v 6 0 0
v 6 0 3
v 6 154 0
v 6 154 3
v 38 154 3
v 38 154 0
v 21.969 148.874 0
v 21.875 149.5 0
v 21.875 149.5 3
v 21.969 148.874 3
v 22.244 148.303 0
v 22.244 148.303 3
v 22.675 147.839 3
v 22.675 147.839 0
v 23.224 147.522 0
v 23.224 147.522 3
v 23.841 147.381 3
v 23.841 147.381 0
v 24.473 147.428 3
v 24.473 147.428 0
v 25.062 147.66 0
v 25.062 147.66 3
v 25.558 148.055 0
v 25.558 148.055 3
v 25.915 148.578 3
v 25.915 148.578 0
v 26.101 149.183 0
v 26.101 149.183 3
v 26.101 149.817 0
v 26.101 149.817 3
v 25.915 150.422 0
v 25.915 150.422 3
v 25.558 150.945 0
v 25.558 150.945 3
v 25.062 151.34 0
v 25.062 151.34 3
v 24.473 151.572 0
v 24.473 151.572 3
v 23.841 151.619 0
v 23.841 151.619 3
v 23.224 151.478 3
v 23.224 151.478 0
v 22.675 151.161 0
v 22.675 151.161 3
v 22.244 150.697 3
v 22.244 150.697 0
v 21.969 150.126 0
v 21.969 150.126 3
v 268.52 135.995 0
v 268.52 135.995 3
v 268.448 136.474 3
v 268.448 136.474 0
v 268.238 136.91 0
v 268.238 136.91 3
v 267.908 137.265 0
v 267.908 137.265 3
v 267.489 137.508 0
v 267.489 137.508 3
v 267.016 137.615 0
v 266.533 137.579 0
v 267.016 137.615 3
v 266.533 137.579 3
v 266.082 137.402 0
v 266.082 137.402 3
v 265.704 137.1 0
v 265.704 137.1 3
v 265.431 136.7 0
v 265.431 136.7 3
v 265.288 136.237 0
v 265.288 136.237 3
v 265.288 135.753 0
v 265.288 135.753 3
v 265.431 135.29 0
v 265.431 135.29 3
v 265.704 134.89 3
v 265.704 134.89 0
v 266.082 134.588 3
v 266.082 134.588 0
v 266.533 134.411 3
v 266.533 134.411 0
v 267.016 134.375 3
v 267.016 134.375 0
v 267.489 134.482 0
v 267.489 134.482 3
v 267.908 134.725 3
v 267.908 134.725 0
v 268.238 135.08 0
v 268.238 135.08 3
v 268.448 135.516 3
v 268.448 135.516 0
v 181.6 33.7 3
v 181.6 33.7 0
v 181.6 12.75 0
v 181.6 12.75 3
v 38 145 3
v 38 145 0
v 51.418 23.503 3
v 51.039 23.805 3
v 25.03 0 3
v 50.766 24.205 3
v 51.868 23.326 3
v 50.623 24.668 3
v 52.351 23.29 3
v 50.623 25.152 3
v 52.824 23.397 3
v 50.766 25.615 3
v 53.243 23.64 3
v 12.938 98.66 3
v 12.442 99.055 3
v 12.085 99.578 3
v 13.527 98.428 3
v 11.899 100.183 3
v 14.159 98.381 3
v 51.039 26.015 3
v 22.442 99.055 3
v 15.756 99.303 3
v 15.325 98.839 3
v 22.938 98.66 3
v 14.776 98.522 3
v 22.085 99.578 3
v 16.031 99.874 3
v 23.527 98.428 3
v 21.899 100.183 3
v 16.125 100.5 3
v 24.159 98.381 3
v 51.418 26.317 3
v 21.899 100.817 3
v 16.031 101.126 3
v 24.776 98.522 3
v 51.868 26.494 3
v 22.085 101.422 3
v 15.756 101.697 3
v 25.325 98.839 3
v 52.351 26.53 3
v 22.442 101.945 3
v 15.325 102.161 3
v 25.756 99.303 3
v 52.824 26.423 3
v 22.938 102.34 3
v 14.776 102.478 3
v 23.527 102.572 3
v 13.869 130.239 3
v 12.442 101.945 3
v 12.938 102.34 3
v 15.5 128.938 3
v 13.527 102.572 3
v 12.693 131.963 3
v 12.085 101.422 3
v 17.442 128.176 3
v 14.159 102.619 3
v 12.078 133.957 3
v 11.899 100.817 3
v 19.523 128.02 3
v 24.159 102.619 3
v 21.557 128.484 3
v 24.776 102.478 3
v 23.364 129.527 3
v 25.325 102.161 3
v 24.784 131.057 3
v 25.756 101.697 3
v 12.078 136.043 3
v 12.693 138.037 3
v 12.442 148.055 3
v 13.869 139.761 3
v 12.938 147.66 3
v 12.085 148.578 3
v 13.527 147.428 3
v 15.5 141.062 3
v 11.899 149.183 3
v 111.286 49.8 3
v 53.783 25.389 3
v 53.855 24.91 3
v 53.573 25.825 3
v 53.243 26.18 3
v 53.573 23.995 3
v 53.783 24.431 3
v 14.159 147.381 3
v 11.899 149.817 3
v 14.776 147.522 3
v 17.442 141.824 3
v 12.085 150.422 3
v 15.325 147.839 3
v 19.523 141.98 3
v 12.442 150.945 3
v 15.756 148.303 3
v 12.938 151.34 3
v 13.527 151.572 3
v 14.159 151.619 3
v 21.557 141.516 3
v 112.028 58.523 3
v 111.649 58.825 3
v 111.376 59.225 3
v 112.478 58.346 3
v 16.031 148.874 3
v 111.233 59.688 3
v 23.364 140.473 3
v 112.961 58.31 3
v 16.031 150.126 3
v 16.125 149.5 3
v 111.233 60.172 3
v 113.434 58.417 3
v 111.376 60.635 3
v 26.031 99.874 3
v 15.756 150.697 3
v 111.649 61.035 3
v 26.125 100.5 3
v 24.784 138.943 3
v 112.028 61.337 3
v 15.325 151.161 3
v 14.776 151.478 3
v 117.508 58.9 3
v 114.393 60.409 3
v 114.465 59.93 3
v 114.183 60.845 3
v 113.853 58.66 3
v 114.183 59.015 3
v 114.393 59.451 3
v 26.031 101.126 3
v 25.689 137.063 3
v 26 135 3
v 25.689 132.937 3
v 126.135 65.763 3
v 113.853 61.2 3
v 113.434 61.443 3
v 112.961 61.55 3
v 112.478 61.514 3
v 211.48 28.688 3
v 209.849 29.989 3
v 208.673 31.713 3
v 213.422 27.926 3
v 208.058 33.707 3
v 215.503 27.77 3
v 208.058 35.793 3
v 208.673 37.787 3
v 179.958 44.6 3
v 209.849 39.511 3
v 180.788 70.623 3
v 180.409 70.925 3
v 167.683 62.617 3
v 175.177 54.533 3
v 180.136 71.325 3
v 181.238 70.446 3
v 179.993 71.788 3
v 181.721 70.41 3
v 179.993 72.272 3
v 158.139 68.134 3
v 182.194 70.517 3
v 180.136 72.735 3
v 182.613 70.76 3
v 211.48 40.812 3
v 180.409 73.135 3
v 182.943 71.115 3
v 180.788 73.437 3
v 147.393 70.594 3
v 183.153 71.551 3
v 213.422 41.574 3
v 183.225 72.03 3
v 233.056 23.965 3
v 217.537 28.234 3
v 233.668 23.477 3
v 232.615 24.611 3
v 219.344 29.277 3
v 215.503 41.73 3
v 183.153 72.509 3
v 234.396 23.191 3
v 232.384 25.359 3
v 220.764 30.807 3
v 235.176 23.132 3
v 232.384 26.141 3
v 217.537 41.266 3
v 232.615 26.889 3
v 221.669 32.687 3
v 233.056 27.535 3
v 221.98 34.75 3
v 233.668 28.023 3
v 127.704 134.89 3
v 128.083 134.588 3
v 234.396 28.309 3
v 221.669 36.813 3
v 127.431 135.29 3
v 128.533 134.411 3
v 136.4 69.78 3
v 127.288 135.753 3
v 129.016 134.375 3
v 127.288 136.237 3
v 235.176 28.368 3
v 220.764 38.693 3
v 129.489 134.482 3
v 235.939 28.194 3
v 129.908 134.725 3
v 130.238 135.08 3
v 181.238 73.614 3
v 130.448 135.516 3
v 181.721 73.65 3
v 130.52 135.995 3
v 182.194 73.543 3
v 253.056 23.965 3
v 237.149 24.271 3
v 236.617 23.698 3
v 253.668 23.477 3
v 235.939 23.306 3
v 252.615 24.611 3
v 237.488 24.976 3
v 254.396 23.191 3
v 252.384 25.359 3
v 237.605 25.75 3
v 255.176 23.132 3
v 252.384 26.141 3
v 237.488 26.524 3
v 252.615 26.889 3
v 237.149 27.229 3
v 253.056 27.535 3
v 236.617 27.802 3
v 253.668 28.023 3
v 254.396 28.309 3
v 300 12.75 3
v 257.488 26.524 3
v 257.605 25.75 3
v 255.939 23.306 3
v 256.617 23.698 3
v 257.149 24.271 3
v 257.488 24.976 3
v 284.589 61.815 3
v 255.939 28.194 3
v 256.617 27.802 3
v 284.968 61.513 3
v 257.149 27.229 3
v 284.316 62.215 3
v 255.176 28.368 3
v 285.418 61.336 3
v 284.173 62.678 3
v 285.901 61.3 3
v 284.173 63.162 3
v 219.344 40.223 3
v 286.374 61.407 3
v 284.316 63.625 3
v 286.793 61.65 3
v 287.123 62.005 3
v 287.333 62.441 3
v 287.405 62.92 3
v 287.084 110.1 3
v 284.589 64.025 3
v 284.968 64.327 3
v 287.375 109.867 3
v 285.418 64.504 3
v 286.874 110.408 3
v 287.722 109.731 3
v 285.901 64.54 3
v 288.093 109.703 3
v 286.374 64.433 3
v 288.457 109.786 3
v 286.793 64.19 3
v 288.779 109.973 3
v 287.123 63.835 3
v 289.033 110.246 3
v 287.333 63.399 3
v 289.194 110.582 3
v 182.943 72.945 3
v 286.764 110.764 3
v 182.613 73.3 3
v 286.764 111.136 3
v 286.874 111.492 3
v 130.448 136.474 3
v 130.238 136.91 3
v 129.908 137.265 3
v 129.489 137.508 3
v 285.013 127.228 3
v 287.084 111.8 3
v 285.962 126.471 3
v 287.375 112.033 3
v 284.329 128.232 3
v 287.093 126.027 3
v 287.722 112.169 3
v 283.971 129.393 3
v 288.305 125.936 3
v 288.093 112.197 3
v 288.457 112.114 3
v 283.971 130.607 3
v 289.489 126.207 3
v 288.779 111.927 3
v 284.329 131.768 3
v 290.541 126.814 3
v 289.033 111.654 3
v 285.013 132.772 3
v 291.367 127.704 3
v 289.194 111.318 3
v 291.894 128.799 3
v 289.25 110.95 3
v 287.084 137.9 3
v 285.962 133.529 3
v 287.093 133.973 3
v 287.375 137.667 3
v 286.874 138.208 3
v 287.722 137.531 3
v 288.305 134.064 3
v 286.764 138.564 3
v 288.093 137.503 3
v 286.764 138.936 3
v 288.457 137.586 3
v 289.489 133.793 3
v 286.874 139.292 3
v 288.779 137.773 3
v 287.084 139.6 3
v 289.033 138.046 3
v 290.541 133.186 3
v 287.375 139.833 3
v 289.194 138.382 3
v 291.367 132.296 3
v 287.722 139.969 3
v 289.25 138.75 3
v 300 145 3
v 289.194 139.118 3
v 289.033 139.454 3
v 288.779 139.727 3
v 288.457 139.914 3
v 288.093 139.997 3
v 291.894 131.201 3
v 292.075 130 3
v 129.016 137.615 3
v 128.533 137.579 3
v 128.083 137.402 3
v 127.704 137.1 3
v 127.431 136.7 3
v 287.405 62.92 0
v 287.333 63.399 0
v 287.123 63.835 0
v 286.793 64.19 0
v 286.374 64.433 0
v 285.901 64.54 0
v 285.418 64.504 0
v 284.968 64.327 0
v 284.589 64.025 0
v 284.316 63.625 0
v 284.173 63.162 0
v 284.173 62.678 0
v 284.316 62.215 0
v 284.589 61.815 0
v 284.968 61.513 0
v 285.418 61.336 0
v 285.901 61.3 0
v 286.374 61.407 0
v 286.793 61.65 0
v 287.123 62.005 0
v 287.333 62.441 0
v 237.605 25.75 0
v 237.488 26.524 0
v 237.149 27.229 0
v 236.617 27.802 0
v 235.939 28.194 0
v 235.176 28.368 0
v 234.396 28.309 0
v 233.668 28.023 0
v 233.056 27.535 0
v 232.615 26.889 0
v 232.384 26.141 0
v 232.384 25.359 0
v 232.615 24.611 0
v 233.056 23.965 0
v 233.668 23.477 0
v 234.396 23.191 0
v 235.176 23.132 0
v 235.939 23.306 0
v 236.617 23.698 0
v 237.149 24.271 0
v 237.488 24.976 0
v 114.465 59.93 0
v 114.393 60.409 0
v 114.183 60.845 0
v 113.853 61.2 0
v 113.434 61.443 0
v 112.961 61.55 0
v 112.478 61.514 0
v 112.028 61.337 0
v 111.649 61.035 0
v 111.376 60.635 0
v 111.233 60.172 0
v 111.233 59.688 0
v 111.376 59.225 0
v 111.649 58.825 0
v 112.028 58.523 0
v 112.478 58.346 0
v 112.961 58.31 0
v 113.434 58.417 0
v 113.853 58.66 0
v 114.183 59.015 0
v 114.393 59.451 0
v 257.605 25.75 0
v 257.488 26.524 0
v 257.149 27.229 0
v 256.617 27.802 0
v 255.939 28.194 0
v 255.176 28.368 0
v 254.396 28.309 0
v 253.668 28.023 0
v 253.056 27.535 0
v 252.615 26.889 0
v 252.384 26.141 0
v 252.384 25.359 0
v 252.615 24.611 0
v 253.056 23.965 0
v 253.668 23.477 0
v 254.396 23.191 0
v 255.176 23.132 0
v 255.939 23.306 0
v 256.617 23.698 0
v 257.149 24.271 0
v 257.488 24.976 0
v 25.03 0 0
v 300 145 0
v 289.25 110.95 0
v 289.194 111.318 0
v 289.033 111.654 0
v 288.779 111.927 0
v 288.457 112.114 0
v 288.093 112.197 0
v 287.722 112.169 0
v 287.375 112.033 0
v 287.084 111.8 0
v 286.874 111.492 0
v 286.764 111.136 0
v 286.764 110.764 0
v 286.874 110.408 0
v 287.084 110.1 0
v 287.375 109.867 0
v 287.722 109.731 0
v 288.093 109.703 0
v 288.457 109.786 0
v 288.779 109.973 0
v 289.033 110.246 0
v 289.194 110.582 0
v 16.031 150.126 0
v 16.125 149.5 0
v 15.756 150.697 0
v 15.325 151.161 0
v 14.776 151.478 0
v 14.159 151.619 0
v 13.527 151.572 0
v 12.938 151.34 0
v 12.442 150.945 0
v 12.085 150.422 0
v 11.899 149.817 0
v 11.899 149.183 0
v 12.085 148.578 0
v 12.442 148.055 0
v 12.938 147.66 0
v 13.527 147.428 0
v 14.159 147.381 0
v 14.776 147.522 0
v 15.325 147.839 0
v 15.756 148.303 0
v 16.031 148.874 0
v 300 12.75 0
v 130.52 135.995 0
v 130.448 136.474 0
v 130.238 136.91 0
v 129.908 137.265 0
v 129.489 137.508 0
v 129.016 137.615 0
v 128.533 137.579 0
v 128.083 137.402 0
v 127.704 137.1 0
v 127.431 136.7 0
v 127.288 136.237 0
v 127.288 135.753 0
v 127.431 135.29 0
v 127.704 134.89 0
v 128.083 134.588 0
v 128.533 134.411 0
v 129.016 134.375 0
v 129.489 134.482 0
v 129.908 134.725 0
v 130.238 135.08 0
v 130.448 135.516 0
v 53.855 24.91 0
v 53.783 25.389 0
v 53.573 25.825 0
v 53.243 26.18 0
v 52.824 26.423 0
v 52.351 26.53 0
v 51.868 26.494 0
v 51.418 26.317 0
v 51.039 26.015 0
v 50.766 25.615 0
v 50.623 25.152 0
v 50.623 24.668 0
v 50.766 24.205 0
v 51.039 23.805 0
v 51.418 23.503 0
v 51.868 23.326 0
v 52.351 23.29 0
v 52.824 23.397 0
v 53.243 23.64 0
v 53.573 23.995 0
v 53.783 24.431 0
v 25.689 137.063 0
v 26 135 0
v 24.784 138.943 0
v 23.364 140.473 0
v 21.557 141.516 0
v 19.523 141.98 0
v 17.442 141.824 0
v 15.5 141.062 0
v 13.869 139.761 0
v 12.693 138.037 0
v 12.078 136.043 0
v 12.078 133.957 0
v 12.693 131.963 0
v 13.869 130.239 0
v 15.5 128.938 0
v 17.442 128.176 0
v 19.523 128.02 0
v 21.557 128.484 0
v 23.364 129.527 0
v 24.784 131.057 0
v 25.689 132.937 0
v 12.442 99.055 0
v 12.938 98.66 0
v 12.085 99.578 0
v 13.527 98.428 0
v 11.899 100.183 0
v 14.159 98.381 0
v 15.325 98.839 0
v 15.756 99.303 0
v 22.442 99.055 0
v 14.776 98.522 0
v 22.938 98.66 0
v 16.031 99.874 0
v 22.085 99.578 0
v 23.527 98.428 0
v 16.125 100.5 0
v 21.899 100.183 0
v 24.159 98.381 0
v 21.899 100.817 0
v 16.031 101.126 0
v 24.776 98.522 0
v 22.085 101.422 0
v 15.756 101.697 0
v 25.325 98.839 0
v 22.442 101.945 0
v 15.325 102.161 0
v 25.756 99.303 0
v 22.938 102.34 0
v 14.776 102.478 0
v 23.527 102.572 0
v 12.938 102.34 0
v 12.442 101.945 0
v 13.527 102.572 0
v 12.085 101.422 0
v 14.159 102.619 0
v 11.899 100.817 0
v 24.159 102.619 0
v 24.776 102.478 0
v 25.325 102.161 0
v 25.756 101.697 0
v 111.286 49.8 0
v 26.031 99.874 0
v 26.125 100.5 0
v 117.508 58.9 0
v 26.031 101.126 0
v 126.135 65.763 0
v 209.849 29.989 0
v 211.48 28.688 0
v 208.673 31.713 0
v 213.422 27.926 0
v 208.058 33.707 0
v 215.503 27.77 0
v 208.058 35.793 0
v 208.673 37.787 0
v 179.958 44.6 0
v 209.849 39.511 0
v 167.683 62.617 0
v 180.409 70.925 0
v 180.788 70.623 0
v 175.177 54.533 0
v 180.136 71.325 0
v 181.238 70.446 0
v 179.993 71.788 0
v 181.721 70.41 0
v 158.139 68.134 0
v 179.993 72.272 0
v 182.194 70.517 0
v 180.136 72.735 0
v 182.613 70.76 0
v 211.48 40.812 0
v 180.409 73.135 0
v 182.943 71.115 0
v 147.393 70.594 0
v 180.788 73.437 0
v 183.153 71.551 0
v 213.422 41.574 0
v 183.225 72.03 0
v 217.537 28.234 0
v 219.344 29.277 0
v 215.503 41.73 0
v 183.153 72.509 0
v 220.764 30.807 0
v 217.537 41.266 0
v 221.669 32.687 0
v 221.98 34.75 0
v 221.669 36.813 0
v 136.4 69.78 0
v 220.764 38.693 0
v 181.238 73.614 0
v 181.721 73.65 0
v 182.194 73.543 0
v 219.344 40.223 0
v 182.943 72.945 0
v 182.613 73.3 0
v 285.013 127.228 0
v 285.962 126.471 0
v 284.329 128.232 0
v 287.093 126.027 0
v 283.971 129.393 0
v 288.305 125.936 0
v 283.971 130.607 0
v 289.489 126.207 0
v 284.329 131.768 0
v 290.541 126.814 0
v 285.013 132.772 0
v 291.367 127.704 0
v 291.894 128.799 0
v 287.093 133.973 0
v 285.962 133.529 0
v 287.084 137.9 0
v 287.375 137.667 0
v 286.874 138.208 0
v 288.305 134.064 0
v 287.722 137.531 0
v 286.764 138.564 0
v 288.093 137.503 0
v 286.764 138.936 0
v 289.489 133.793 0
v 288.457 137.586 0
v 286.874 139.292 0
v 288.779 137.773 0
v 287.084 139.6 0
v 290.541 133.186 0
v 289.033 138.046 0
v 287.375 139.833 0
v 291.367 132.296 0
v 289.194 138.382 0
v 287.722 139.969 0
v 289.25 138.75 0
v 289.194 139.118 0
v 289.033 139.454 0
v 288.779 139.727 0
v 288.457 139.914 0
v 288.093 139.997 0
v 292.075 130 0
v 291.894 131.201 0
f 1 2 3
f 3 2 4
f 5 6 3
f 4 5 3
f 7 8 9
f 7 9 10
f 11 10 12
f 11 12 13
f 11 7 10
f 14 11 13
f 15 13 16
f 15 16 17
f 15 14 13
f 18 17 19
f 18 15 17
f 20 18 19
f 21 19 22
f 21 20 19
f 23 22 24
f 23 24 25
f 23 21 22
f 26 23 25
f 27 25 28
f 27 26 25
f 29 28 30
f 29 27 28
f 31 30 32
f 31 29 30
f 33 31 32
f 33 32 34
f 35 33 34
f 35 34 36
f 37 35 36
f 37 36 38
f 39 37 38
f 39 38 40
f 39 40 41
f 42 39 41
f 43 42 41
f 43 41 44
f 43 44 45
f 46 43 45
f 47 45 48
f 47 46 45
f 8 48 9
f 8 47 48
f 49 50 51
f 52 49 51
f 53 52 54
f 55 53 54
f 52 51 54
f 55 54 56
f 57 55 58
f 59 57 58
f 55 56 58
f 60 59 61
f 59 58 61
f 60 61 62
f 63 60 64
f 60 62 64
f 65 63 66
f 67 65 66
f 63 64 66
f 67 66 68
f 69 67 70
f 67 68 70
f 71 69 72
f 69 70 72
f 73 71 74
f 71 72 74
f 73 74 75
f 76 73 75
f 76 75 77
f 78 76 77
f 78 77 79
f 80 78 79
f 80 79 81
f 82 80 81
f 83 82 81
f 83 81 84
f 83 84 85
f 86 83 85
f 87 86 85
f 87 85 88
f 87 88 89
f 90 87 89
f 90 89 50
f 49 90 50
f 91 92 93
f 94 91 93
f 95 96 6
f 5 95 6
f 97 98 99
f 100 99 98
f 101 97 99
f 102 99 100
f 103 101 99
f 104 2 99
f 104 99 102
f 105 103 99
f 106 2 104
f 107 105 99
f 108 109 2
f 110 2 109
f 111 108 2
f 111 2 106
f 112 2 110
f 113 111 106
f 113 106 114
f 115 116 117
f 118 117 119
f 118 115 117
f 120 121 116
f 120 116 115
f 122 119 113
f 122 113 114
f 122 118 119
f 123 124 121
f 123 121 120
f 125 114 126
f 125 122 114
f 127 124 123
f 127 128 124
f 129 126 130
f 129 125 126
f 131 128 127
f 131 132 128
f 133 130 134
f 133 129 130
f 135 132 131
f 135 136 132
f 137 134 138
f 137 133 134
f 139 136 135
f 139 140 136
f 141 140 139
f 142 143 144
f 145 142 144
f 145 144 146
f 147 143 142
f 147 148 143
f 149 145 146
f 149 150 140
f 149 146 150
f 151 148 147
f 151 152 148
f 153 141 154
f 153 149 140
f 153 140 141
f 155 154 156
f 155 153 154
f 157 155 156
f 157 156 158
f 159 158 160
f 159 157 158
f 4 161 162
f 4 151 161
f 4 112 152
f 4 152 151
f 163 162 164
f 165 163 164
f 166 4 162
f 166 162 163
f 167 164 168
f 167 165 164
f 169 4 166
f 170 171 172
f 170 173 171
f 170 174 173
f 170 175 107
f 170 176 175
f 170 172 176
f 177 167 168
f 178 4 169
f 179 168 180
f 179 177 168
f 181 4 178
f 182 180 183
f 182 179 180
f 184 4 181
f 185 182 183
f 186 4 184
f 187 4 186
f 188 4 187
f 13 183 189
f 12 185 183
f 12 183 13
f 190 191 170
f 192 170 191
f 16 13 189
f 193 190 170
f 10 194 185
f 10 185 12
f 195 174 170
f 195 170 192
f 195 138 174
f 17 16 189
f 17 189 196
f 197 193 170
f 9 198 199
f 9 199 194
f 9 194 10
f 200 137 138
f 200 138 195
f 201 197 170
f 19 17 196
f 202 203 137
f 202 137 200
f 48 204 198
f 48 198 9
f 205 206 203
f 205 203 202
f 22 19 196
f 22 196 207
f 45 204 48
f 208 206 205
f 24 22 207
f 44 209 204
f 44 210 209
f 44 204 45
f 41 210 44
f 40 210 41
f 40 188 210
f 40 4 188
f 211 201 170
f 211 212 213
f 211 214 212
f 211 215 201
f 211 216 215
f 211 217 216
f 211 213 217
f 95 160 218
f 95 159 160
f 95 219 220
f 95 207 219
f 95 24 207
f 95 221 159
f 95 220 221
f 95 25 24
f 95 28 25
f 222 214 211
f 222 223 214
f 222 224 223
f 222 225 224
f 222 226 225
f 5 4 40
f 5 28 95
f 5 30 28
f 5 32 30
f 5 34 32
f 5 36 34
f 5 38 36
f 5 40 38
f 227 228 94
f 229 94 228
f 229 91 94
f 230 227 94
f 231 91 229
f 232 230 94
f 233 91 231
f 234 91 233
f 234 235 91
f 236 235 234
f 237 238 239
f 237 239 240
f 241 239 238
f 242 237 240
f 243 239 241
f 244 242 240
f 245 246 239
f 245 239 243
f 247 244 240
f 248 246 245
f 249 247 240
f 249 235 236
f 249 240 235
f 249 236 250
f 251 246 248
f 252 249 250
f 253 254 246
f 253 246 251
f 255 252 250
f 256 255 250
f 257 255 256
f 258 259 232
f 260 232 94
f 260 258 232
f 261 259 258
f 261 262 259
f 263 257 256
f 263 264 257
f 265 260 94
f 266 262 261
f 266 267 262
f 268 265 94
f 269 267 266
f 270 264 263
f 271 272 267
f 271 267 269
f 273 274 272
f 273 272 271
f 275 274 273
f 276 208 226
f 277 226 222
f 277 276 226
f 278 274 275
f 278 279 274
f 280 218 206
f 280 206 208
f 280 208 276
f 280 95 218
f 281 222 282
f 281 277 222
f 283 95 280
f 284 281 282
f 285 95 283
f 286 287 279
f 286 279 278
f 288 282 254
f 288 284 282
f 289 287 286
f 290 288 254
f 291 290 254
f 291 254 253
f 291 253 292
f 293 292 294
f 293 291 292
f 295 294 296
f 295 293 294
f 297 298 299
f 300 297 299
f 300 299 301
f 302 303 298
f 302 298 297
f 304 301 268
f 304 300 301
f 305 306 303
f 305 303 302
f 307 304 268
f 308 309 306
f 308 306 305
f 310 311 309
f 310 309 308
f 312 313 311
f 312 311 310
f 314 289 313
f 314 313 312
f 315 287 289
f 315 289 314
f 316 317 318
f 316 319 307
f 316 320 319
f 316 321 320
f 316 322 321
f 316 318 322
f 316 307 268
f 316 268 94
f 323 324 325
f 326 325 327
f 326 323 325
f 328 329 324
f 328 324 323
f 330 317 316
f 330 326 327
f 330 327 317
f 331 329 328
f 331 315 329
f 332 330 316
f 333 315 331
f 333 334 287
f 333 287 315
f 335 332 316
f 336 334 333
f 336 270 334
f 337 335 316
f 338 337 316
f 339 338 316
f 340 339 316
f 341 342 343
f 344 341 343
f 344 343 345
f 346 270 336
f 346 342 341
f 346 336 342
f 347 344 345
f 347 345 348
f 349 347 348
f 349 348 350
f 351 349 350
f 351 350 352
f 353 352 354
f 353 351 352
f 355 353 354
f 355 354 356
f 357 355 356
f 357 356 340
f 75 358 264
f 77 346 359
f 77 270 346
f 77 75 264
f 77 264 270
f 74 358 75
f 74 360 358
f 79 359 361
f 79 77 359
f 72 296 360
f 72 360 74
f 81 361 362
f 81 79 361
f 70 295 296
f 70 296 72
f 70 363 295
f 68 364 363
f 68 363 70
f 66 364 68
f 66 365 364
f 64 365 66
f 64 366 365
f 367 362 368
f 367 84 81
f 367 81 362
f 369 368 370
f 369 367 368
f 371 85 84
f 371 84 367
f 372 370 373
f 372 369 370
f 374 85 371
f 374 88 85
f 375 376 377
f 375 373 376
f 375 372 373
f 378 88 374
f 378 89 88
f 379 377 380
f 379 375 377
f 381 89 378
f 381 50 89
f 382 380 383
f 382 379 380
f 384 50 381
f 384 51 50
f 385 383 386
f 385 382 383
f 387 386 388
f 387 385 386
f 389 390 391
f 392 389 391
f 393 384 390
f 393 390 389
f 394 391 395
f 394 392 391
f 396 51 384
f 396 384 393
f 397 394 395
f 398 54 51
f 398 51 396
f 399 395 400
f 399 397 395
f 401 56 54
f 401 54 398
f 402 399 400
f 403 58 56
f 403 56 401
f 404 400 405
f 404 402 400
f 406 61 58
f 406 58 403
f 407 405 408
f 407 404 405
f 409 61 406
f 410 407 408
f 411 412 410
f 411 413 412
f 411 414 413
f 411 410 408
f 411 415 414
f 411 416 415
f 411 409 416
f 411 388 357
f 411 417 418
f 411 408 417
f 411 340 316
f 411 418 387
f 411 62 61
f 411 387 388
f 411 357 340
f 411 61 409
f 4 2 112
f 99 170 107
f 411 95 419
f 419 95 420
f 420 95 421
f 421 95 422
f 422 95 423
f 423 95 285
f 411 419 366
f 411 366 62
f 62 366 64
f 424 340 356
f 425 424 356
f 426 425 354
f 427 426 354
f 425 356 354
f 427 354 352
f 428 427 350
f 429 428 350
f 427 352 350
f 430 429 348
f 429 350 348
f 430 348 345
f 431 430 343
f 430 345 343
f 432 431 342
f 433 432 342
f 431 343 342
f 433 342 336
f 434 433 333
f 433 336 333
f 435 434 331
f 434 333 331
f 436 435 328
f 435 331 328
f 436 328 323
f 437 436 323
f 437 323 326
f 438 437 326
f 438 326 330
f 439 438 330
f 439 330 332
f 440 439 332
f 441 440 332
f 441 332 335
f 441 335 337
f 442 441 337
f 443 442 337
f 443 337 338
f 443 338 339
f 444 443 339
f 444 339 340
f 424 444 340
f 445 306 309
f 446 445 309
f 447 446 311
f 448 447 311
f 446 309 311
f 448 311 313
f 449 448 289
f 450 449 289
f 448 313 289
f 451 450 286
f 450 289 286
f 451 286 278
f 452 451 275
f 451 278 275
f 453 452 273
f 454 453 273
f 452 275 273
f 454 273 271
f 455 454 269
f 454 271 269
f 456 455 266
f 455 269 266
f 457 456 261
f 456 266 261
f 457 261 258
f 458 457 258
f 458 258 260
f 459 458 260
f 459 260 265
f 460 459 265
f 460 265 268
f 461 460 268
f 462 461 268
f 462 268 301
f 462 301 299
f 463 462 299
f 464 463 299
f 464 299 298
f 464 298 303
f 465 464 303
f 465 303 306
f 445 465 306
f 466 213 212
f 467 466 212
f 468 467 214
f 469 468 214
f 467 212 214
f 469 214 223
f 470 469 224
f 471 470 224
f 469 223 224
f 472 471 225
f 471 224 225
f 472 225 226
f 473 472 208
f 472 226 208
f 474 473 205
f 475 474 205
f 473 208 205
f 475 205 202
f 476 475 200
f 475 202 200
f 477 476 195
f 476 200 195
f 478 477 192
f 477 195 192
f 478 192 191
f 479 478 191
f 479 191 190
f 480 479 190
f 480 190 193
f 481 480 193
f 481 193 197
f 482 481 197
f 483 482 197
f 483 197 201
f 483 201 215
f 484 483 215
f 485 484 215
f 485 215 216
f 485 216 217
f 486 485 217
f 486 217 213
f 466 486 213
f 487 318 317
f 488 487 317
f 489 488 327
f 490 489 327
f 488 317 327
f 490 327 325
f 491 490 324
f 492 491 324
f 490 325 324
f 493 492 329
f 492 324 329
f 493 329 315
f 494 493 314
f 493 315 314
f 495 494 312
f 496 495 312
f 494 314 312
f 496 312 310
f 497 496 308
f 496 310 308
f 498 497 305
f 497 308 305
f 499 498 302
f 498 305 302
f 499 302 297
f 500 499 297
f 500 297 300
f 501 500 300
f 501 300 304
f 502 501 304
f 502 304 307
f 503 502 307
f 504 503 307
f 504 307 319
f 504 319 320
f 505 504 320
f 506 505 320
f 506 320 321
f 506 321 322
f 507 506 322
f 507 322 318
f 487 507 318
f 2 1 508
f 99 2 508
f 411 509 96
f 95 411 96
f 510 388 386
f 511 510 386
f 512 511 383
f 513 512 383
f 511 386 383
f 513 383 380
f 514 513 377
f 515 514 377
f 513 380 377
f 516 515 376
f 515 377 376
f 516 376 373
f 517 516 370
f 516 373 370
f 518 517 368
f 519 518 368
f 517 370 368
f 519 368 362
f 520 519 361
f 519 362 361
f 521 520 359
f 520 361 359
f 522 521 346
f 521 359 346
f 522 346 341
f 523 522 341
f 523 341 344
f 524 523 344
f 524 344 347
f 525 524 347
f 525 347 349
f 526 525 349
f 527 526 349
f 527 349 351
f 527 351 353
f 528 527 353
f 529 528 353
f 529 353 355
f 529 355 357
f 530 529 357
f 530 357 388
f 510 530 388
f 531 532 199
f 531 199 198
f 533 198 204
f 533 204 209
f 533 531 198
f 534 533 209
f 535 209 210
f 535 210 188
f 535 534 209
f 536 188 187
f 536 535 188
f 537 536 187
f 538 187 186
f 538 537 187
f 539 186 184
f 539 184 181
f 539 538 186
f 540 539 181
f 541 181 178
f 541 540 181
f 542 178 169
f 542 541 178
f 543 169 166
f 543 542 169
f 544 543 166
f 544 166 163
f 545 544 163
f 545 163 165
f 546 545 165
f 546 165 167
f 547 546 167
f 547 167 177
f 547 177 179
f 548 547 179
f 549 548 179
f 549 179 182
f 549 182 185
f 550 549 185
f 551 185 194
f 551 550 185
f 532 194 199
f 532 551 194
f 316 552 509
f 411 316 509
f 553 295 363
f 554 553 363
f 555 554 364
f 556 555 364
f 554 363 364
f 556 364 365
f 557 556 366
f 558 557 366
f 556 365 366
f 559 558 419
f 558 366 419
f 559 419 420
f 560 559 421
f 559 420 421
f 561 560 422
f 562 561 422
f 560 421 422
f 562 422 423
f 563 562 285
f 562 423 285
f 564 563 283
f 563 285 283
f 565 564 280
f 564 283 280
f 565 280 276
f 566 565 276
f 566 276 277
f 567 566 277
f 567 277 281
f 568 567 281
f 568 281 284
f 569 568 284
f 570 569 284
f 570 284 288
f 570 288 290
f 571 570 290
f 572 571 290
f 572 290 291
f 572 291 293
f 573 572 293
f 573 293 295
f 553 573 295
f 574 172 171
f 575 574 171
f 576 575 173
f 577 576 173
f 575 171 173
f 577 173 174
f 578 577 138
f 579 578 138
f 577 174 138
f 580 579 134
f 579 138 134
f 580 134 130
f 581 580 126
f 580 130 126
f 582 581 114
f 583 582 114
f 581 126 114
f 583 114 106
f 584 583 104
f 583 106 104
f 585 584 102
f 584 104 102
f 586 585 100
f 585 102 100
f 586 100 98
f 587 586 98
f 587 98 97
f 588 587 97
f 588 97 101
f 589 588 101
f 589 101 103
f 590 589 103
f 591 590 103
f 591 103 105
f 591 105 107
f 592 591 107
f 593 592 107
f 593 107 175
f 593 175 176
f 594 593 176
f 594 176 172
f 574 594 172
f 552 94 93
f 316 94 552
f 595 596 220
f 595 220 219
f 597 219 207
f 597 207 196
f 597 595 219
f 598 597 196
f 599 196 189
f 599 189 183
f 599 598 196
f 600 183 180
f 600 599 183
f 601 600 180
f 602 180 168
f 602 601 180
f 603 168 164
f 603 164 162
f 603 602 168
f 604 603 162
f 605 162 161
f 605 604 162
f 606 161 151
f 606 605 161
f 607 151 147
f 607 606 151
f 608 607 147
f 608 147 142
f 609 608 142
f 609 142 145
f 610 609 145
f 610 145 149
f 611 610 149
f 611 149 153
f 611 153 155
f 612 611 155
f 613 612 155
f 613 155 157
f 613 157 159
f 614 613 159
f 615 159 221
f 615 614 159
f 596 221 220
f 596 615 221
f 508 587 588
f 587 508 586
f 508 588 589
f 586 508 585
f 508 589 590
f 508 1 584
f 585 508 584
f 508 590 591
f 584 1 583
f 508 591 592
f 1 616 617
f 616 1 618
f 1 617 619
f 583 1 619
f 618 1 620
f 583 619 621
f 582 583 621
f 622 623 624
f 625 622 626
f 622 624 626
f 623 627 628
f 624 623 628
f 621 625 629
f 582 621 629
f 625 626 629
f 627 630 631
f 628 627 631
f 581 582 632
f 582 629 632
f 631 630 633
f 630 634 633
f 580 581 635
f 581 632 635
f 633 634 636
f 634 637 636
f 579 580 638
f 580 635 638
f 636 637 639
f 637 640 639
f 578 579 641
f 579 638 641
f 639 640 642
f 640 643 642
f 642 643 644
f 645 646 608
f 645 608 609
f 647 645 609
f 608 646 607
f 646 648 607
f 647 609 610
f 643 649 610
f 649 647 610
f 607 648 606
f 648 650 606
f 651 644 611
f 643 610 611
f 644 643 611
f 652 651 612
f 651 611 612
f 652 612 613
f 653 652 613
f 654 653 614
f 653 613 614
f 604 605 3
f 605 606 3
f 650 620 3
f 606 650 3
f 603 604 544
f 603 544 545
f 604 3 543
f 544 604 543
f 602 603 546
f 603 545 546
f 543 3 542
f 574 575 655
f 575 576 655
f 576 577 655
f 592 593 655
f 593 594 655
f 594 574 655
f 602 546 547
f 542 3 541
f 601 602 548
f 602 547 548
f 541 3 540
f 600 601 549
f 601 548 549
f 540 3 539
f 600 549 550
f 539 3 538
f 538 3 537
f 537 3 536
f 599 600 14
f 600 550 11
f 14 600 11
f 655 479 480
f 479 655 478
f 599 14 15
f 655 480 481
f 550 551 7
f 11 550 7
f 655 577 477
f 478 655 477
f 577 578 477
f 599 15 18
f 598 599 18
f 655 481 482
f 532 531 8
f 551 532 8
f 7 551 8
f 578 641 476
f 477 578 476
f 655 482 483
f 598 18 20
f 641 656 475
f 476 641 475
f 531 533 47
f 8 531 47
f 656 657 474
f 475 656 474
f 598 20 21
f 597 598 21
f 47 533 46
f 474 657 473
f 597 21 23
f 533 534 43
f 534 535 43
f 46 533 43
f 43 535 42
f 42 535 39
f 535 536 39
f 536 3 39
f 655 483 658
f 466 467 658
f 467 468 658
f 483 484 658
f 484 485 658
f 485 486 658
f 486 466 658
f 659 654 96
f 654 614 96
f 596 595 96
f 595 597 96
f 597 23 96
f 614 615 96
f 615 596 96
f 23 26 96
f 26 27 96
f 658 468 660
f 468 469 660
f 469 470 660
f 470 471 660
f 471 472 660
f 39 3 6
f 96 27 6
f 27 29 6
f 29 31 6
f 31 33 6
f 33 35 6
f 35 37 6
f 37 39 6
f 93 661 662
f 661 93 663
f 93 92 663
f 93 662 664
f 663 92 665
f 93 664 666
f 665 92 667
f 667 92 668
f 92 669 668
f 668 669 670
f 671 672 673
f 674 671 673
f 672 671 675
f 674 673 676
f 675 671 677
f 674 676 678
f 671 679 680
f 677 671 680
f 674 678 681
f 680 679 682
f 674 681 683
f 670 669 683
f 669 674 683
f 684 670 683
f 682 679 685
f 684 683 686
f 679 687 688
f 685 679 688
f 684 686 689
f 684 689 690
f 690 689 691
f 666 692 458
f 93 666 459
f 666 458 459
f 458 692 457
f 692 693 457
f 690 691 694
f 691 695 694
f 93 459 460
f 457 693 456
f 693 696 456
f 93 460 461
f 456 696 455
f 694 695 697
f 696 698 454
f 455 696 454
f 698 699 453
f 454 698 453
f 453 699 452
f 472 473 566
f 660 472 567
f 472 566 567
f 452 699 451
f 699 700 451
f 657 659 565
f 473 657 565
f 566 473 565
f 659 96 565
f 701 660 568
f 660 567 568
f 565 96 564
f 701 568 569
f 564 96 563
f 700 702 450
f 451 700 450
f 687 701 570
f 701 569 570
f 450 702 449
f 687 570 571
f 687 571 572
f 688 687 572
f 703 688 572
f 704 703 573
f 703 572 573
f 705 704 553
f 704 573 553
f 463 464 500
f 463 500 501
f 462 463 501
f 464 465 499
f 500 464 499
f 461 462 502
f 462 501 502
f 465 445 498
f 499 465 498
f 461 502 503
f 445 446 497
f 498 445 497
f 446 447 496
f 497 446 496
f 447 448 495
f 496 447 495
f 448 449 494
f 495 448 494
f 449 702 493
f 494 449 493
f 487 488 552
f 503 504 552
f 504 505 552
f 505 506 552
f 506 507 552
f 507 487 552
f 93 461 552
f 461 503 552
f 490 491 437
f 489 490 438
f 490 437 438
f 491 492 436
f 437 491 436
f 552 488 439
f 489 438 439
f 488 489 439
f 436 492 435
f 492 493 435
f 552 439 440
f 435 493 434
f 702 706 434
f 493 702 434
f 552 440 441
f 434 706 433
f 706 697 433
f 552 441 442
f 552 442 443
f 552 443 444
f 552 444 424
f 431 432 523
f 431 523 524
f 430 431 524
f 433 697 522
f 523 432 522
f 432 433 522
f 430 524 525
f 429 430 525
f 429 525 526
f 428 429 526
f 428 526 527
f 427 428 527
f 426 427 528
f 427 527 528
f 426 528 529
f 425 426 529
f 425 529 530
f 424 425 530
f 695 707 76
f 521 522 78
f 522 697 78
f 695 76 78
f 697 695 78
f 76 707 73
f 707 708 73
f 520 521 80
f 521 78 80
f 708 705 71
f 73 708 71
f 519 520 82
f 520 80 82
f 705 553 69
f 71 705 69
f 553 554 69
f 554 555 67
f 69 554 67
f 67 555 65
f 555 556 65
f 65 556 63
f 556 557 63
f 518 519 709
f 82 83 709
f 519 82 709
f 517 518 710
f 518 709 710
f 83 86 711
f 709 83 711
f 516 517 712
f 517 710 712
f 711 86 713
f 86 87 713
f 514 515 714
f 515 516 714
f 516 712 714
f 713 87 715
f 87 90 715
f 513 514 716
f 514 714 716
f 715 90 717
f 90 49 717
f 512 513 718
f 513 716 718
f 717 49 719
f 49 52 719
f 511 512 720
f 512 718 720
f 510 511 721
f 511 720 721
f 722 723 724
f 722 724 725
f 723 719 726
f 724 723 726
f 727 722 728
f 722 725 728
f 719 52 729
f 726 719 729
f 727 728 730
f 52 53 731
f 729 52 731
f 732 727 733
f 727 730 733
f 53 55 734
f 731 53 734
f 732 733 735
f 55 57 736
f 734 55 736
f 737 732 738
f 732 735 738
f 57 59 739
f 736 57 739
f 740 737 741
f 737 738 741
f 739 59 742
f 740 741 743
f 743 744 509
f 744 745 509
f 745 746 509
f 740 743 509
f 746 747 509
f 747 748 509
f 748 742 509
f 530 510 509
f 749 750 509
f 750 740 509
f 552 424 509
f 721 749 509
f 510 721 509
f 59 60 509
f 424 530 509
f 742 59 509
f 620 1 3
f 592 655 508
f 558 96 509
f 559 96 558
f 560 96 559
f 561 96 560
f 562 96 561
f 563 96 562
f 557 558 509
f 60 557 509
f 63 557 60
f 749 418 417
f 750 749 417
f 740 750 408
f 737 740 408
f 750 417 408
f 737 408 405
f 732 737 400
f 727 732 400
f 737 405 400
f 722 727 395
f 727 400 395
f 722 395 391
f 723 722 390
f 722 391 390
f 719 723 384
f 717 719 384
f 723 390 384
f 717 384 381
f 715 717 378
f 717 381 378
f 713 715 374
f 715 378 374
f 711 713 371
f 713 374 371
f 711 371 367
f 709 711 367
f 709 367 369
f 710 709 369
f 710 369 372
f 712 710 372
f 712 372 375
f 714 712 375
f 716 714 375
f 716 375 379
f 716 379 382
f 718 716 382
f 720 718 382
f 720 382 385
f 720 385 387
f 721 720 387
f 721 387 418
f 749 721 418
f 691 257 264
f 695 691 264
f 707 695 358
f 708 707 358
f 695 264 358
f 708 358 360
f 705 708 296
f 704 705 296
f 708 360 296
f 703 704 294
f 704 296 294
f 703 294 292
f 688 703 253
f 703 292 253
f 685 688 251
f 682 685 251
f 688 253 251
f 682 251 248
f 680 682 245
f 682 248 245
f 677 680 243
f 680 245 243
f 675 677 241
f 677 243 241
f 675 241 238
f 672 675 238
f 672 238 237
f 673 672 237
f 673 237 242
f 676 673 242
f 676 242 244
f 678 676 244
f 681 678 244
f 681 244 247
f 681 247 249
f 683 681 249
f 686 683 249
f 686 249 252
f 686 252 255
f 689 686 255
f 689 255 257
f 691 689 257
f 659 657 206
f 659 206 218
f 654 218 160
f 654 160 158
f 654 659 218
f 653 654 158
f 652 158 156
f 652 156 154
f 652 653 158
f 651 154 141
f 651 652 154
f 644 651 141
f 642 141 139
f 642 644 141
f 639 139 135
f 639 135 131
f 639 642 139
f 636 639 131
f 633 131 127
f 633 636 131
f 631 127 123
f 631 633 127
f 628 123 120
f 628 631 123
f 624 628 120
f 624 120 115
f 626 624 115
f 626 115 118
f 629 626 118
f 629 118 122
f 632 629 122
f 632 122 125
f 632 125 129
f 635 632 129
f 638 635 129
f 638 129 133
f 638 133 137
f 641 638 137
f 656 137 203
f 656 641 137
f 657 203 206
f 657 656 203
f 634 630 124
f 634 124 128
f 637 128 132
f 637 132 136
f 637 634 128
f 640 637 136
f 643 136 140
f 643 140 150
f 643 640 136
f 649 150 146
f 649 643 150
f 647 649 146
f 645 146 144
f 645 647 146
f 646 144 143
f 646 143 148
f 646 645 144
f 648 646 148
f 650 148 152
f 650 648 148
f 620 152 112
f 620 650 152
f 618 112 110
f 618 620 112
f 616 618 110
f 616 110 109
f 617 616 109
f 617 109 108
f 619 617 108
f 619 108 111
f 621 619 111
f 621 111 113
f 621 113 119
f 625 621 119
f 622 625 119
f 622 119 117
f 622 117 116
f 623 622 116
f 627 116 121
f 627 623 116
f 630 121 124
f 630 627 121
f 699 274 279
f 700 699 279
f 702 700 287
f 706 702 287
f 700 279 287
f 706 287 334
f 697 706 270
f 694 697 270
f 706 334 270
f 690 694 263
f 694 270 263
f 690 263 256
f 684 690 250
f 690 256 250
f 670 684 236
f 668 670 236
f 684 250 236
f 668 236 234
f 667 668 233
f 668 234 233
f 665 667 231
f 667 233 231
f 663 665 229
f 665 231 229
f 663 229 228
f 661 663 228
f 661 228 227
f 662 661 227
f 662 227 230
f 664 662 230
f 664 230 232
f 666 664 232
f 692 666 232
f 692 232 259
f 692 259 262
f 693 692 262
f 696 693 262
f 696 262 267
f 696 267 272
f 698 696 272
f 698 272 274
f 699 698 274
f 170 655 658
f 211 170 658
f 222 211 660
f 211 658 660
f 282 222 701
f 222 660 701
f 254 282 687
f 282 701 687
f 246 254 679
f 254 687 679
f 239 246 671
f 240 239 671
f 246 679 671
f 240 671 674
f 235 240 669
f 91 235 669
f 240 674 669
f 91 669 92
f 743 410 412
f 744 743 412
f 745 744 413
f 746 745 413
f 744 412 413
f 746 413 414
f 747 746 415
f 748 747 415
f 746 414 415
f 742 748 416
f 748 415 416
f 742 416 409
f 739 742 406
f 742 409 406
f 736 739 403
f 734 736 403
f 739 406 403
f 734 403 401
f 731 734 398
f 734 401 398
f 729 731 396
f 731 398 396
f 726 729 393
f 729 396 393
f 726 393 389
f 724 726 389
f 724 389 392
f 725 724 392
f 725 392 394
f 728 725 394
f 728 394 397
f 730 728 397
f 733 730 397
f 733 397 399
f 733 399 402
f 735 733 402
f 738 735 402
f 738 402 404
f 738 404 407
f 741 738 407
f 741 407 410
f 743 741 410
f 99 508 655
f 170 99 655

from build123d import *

# Parameters (mm, degrees)
SKETCH2_R           = 7
SKETCH2_R_2         = 2.125
BOSS_EXTRUDE2_DEPTH = 3
SKETCH3_W           = 118.4
SKETCH3_H           = 12.75
CUT_EXTRUDE1_DEPTH  = 338.231374578
SKETCH5_R           = 2.625
SKETCH5_R_2         = 4.075
SKETCH5_R_3         = 1.25
SKETCH5_R_4         = 1.625
SKETCH5_R_5         = 7
SKETCH5_W           = 6
SKETCH5_H           = 154
CUT_EXTRUDE2_DEPTH  = 338.231374578


with BuildPart() as part:
    # Sketch2 → Boss-Extrude2 (new body)
    with BuildSketch(Plane.XY):
        with BuildLine():
            Line((25.03035901, 0), (111.286489227, 49.8))
            ThreePointArc((111.286489227, 49.8), (152.858332199, 69.766604349), (181.6, 33.7))
            Line((181.6, 33.7), (181.6, 0))
            Line((181.6, 0), (300, 0))
            Line((300, 0), (300, 145))
            Line((300, 145), (38, 145))
            Line((38, 145), (38, 154))
            Line((38, 154), (19, 154))
            Line((19, 154), (0, 154))
            Line((0, 154), (0, 0))
            Line((0, 0), (25.03035901, 0))
        make_face()
        with Locations((19, 135)):
            Circle(SKETCH2_R, mode=Mode.SUBTRACT)
        with Locations((14, 149.5)):
            Circle(SKETCH2_R_2, mode=Mode.SUBTRACT)
        with Locations(Location((24, 149.5, 0), (0, 0, 180))):
            Circle(SKETCH2_R_2, mode=Mode.SUBTRACT)
        with Locations((24, 100.5)):
            Circle(SKETCH2_R_2, mode=Mode.SUBTRACT)
        with Locations((14, 100.5)):
            Circle(SKETCH2_R_2, mode=Mode.SUBTRACT)
    extrude(amount=BOSS_EXTRUDE2_DEPTH)

    # Sketch3 → Cut-Extrude1 (cut, through all)
    with BuildSketch(Plane.XY.offset(3)):
        with Locations((240.8, 6.375)):
            Rectangle(SKETCH3_W, SKETCH3_H)
    extrude(amount=-CUT_EXTRUDE1_DEPTH, mode=Mode.SUBTRACT)

    # Sketch5 → Cut-Extrude2 (cut, through all)
    with BuildSketch(Plane.XY.offset(3)):
        with Locations((254.98, 25.75)):
            Circle(SKETCH5_R)
        with Locations((234.98, 25.75)):
            Circle(SKETCH5_R)
        with Locations((288, 130)):
            Circle(SKETCH5_R_2)
        with Locations((288, 138.75)):
            Circle(SKETCH5_R_3)
        with Locations((288, 110.95)):
            Circle(SKETCH5_R_3)
        with Locations((285.78, 62.92)):
            Circle(SKETCH5_R_4)
        with Locations((181.6, 72.03)):
            Circle(SKETCH5_R_4)
        with Locations((52.23, 24.91)):
            Circle(SKETCH5_R_4)
        with Locations((112.84, 59.93)):
            Circle(SKETCH5_R_4)
        with Locations((266.895, 135.995)):
            Circle(SKETCH5_R_4)
        with Locations((128.895, 135.995)):
            Circle(SKETCH5_R_4)
        with Locations((214.98, 34.75)):
            Circle(SKETCH5_R_5)
        with Locations((3, 77)):
            Rectangle(SKETCH5_W, SKETCH5_H)
    extrude(amount=-CUT_EXTRUDE2_DEPTH, mode=Mode.SUBTRACT)


solid = part.part
